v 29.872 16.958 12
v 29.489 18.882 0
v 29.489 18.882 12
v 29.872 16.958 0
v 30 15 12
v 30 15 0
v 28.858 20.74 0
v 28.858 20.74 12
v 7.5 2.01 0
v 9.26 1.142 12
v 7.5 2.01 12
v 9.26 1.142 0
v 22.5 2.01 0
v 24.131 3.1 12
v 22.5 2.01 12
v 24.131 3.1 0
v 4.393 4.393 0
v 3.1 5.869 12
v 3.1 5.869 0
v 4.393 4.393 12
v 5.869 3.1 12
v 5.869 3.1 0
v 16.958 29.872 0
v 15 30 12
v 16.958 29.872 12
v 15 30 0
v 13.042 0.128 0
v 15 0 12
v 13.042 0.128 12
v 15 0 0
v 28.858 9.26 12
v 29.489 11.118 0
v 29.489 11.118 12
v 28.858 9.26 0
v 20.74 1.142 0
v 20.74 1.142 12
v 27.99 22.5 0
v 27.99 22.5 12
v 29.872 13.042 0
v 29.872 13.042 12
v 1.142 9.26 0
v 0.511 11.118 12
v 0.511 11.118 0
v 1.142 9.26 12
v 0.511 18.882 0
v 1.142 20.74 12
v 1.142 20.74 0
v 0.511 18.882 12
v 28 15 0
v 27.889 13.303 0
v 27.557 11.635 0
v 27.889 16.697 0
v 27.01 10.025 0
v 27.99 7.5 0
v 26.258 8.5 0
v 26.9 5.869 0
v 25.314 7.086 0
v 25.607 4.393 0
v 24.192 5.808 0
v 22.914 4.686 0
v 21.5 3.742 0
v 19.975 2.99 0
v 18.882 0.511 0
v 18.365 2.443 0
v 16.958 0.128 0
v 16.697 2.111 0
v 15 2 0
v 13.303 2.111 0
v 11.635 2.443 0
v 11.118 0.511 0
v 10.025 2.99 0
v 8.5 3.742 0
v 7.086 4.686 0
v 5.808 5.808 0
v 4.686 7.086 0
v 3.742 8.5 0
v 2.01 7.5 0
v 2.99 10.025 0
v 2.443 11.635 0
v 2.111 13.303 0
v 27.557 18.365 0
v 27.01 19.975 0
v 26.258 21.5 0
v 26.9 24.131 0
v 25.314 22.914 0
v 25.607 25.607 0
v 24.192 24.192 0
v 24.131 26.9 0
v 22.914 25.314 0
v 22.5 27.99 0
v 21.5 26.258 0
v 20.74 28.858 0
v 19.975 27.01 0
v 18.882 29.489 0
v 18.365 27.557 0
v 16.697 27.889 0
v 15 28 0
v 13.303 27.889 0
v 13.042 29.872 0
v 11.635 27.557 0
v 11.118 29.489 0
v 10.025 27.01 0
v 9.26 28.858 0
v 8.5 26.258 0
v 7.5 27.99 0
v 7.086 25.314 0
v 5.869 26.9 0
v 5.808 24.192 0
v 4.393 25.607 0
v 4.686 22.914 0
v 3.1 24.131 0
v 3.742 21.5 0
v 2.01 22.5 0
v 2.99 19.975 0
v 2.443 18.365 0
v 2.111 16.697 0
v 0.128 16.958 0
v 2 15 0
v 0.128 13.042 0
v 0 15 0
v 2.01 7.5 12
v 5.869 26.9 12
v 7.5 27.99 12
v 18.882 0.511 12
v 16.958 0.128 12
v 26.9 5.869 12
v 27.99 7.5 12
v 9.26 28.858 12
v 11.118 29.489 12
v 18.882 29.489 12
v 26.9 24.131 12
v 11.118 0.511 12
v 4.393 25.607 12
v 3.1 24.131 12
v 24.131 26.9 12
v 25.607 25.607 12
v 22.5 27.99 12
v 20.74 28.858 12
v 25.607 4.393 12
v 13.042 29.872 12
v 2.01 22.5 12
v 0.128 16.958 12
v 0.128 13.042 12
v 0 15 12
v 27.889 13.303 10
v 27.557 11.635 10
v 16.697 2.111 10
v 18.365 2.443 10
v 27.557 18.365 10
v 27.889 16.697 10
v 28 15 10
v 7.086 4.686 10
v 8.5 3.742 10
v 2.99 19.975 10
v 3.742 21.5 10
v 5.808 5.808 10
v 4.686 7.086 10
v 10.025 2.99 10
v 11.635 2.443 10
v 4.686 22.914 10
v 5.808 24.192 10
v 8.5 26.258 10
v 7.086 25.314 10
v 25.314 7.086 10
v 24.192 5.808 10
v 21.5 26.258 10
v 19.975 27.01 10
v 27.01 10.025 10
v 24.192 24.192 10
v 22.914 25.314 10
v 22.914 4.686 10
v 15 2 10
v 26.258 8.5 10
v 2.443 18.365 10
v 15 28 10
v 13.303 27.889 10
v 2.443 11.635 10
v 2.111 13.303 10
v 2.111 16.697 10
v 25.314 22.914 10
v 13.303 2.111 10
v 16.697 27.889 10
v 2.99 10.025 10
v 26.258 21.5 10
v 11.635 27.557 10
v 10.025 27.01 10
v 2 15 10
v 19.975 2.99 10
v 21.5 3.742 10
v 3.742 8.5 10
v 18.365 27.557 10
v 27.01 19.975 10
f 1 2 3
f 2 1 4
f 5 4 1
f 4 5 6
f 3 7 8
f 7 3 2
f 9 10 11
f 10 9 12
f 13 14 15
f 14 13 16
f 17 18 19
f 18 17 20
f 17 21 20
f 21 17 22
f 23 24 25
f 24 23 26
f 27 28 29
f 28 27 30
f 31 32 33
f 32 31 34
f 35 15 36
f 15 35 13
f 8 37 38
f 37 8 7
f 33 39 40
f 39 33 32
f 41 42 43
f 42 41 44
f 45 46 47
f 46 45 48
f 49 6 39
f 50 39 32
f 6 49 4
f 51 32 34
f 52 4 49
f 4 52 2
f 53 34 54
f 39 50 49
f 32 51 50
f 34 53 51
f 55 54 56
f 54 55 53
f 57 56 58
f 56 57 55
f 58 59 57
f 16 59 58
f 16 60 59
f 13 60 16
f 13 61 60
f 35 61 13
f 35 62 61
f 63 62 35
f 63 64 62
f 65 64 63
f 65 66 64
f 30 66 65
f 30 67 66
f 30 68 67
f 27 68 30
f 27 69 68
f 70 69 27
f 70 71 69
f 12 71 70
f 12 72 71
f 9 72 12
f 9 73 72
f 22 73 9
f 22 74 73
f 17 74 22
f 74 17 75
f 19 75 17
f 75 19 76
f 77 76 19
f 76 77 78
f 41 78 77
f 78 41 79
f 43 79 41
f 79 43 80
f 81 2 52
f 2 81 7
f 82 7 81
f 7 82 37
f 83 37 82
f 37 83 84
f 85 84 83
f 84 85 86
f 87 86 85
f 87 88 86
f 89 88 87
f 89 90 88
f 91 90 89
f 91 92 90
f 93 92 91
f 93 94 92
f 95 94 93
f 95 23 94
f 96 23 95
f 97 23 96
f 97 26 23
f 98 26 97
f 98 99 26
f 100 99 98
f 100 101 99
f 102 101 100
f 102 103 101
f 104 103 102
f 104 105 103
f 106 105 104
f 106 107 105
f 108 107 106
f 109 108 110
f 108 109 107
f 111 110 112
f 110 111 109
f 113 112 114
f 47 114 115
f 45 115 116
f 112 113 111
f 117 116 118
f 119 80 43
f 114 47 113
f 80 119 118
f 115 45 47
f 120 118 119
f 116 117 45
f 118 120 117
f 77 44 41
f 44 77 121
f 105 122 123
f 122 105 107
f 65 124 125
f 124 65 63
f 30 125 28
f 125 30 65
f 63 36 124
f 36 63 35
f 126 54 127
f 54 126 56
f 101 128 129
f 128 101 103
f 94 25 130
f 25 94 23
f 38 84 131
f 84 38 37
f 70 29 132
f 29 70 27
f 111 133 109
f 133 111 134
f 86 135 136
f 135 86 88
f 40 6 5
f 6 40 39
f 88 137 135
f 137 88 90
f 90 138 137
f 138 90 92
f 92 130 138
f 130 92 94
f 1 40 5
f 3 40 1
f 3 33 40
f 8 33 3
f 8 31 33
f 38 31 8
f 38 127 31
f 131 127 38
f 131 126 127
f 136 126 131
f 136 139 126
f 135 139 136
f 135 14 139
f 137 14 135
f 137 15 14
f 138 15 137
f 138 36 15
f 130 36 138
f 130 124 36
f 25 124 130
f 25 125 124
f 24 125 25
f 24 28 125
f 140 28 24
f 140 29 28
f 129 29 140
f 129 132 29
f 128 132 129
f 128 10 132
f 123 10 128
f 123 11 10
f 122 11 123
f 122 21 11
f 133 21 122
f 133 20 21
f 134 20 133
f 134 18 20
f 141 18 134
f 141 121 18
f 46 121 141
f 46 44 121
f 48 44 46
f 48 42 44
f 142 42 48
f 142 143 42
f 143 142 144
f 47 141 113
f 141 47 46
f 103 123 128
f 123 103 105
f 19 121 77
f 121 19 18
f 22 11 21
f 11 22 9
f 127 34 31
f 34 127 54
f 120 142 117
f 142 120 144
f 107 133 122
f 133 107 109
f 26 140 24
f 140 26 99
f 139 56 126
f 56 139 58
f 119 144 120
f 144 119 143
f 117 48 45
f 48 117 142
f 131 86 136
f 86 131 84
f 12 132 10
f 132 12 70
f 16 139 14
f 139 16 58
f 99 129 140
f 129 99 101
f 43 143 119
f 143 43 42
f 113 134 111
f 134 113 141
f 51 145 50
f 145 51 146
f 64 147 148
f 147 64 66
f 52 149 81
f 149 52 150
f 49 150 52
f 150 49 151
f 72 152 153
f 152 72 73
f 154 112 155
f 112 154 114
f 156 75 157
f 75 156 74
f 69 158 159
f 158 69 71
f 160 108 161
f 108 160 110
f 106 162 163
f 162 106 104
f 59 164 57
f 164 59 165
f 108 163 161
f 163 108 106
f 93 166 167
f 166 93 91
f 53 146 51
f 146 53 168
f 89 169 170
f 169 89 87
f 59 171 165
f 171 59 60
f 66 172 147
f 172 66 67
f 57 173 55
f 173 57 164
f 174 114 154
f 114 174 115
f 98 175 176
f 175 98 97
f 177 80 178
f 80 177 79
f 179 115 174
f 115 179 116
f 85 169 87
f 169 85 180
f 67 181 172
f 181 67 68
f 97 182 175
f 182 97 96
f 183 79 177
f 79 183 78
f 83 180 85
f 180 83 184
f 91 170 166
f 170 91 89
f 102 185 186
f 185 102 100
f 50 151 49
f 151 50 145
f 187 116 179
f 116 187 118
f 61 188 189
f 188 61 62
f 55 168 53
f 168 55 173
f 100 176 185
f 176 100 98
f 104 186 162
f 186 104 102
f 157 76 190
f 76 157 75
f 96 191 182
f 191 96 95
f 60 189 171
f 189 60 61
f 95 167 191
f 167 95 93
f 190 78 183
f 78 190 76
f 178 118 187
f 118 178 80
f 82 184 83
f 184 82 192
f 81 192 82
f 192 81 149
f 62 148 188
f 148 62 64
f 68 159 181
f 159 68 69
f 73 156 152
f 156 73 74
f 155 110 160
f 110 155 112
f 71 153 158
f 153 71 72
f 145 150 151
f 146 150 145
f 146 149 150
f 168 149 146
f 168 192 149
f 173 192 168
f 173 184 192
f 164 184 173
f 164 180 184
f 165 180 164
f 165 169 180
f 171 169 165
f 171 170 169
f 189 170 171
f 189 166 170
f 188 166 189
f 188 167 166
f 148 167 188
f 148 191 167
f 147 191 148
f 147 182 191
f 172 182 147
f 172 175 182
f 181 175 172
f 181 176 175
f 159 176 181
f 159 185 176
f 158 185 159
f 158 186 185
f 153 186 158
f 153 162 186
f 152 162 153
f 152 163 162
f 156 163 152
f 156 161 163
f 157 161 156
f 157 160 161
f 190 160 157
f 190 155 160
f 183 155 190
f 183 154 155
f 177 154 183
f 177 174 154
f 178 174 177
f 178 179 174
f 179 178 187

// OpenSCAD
// units=mm — generated by scad_emitter.py
// part=unnamed
$fn = 48;

difference() { translate([15, 15, 0]) cylinder(h=12, r=15, $fn=$fn); translate([15, 15, -0.5]) cylinder(h=10.5, r=13, $fn=$fn); }
